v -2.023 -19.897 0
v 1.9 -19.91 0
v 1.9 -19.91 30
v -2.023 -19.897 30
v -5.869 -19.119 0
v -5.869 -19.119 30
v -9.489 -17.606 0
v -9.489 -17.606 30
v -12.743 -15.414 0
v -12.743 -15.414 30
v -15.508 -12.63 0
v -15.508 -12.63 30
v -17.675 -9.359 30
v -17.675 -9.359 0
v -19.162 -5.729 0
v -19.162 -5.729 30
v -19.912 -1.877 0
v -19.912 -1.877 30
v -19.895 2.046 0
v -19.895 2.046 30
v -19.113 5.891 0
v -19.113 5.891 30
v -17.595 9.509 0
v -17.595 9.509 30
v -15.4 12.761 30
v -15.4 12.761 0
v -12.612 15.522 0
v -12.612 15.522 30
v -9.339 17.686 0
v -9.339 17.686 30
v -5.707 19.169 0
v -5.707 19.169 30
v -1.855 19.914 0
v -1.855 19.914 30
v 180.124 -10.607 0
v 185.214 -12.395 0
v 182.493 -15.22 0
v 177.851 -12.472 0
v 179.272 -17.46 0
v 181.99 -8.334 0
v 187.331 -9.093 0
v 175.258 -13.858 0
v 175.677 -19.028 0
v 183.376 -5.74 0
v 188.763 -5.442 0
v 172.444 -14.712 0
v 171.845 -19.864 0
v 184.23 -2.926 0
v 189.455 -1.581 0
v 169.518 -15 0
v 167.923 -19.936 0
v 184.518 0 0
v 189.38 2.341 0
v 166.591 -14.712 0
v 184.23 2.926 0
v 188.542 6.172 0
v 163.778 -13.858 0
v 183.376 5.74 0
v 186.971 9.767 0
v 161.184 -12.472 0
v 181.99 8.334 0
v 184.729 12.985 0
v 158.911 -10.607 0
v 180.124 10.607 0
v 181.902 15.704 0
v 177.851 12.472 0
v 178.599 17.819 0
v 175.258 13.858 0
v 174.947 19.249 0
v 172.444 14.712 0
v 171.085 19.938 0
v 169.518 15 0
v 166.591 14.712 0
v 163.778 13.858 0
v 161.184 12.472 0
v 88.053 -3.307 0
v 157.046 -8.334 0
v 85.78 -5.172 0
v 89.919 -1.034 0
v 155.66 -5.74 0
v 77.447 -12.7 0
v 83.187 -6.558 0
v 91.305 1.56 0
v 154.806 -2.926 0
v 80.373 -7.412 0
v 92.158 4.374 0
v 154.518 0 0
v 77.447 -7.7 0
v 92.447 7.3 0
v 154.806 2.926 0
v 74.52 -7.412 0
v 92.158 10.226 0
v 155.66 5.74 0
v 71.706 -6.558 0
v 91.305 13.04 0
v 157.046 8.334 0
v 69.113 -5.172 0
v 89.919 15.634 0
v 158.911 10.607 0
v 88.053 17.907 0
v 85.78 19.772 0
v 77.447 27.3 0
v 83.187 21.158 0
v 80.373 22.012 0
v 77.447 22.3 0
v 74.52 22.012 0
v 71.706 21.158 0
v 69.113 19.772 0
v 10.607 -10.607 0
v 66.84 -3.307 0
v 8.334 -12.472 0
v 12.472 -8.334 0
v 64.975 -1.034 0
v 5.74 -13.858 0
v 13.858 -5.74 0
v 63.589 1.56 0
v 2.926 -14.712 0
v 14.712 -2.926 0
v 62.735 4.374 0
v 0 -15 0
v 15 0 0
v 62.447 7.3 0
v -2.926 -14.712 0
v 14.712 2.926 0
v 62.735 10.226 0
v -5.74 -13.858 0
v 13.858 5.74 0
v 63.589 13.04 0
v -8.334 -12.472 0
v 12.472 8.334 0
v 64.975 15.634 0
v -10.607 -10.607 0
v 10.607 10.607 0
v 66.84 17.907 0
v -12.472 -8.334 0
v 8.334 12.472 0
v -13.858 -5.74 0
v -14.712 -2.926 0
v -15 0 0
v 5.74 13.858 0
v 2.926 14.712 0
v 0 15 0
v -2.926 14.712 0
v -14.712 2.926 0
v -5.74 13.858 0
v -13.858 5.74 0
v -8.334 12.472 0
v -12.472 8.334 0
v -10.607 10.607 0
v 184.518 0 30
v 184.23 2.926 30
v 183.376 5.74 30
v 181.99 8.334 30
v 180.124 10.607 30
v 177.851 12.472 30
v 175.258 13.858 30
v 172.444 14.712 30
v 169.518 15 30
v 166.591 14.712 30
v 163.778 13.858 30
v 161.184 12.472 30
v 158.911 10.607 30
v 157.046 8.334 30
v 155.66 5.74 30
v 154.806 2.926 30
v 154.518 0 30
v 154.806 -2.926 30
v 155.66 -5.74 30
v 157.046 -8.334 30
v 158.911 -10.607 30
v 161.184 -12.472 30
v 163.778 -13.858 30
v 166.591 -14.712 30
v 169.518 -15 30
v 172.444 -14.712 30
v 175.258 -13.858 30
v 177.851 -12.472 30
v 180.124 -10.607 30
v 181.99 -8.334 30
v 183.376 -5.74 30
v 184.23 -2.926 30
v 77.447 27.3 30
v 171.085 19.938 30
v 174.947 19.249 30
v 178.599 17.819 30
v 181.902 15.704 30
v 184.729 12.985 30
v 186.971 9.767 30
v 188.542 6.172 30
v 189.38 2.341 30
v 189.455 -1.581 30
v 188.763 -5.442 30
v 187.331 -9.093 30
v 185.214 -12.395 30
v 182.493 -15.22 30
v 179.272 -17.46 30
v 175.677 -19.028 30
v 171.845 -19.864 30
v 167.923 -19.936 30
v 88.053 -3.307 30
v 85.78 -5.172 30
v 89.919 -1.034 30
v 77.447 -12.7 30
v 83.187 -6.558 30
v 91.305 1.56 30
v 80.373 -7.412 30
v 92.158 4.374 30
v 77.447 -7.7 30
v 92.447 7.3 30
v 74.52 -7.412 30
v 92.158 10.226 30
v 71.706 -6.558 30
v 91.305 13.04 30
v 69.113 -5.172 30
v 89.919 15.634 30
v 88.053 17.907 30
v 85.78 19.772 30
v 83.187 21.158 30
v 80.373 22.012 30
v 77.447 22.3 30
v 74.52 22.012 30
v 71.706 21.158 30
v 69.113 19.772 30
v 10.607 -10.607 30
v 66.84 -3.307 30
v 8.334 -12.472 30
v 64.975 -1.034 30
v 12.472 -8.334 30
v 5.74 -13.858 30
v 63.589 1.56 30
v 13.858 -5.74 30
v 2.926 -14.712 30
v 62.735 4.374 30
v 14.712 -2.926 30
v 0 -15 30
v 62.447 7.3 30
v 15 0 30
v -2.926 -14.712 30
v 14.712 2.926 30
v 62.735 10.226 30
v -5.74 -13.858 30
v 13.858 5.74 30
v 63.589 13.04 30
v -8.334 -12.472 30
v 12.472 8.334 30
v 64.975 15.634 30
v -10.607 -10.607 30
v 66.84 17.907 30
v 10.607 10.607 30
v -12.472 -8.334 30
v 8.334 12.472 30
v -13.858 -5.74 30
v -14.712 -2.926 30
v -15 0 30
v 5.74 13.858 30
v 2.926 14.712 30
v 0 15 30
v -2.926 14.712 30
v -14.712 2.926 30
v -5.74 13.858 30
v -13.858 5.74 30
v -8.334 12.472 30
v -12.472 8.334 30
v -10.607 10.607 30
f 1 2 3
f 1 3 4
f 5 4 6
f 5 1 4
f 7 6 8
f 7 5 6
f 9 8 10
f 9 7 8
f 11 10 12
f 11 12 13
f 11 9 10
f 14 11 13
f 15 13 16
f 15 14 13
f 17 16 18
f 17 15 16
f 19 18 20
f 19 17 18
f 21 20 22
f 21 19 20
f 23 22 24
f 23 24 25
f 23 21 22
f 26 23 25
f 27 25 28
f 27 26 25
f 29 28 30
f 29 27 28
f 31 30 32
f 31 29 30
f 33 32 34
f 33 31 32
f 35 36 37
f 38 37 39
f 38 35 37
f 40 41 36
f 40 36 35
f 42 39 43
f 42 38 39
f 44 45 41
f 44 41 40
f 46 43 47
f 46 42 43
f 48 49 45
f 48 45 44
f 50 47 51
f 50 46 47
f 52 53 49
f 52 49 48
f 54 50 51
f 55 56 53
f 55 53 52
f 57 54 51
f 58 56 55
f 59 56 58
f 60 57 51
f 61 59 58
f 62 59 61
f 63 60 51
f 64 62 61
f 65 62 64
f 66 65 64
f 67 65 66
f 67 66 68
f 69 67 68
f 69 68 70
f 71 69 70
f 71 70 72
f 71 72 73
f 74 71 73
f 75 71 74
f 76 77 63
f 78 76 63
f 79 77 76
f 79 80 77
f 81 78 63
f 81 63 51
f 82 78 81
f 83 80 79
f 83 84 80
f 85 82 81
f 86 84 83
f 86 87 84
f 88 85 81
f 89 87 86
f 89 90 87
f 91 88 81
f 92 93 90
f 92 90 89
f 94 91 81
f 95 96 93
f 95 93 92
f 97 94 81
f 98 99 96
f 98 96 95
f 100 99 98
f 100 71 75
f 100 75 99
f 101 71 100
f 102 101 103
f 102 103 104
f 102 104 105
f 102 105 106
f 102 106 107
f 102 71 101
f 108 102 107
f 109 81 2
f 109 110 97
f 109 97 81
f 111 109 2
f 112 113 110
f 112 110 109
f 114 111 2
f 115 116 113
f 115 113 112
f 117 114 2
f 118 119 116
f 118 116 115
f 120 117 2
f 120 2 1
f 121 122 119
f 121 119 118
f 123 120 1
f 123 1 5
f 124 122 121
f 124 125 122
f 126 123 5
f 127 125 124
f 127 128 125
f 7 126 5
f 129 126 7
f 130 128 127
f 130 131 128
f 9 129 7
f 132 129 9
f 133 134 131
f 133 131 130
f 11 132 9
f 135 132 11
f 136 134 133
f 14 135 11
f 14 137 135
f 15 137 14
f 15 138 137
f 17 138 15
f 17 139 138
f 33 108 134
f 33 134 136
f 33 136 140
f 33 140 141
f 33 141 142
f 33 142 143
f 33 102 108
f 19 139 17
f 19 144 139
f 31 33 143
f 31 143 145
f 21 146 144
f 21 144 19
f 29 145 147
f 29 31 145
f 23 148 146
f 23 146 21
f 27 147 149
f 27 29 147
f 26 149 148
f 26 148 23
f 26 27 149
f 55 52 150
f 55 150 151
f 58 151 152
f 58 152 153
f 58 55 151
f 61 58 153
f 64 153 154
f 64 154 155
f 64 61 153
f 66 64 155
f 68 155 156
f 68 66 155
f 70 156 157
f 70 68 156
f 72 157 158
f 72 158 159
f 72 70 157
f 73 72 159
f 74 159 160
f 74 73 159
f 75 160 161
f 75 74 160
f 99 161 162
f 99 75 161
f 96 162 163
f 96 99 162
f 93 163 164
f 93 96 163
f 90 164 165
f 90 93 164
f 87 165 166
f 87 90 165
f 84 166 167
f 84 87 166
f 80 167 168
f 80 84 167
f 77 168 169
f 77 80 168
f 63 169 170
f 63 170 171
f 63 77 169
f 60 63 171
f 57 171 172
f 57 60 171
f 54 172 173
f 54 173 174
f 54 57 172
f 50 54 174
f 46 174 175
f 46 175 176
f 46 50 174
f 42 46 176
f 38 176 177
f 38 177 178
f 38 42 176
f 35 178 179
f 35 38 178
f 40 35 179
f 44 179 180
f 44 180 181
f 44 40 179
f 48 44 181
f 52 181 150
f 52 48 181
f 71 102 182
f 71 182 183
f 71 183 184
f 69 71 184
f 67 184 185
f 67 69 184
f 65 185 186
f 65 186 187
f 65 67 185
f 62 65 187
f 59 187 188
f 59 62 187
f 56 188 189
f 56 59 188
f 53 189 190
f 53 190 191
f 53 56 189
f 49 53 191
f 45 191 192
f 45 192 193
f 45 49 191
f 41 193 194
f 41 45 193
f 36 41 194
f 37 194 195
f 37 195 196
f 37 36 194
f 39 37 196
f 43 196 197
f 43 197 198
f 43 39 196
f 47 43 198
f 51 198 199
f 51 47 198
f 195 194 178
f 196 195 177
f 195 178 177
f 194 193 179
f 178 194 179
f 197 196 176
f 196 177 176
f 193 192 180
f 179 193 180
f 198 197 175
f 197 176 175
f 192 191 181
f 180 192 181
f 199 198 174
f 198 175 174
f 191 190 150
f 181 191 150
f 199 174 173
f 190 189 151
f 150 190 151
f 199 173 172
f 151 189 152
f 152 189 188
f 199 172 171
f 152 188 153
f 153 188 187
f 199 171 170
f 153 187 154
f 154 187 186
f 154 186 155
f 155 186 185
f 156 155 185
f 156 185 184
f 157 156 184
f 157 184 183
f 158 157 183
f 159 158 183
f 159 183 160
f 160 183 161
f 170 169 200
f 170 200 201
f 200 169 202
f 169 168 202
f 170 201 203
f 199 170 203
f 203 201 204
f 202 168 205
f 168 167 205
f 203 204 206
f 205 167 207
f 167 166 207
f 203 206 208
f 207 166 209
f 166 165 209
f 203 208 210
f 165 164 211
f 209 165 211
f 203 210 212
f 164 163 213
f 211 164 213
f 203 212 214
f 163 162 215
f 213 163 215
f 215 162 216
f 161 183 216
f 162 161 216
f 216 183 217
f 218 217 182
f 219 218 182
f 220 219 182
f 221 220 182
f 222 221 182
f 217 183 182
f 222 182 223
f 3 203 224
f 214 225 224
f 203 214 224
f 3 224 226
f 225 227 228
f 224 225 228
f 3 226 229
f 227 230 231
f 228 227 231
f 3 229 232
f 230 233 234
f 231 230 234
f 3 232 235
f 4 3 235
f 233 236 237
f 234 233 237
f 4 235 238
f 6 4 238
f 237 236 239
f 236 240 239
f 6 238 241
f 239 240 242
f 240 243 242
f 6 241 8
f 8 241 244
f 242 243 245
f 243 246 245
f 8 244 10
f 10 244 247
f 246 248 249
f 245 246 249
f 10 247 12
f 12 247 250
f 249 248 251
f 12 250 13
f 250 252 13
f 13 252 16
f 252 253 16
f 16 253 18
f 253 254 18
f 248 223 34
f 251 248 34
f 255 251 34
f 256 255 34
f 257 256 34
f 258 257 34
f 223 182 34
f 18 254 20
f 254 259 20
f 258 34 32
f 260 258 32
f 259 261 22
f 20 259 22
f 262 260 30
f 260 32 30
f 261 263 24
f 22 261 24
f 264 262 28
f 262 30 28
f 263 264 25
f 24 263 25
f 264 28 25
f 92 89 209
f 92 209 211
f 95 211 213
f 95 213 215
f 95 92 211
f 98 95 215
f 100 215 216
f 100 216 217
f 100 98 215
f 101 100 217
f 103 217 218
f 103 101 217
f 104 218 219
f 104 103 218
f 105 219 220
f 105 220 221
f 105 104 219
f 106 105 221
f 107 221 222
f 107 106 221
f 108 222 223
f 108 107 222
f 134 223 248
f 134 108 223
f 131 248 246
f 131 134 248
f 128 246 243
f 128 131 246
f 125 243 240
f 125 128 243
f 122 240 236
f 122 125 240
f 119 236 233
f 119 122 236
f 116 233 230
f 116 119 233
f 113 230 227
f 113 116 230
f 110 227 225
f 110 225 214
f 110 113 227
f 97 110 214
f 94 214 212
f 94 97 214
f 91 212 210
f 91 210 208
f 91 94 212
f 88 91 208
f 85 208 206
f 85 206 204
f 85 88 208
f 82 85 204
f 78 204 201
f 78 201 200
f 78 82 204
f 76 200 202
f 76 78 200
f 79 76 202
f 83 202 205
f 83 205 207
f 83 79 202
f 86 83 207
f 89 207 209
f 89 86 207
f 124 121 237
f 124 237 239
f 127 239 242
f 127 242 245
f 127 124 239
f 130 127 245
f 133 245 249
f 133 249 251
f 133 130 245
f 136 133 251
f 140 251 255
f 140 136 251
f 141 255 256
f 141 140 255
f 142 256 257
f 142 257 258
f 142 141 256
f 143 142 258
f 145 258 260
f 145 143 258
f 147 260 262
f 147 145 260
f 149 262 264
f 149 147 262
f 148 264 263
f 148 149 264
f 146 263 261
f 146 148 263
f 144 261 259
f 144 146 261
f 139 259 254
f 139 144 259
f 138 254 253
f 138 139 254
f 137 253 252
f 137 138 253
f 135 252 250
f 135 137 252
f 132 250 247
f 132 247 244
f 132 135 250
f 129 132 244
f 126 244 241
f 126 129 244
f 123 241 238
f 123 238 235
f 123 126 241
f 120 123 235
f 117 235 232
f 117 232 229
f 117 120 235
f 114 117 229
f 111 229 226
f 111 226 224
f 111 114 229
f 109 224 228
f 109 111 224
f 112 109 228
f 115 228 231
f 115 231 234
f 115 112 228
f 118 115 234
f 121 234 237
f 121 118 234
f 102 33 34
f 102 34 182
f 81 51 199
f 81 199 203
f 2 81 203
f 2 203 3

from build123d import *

# Parameters (mm, degrees)
SKETCH1_R           = 15
BOSS_EXTRUDE1_DEPTH = 30


with BuildPart() as part:
    # Sketch1 → Boss-Extrude1 (new body)
    with BuildSketch(Plane.XY):
        with BuildLine():
            Line((-1.85478455, 19.913808633), (77.446717813, 27.3))
            Line((77.446717813, 27.3), (171.085265534, 19.938479729))
            ThreePointArc((171.085265534, 19.938479729), (189.455188028, -1.581002183), (167.923261894, -19.936336862))
            Line((167.923261894, -19.936336862), (77.446717813, -12.7))
            Line((77.446717813, -12.7), (1.900000117, -19.909545438))
            ThreePointArc((1.900000117, -19.909545438), (-19.91168987, -1.877393544), (-1.85478455, 19.913808633))
        make_face()
        with Locations((77.446717813, 7.3)):
            Circle(SKETCH1_R, mode=Mode.SUBTRACT)
        with Locations((169.517775155, 0)):
            Circle(SKETCH1_R, mode=Mode.SUBTRACT)
        Circle(SKETCH1_R, mode=Mode.SUBTRACT)
    extrude(amount=BOSS_EXTRUDE1_DEPTH)


solid = part.part
